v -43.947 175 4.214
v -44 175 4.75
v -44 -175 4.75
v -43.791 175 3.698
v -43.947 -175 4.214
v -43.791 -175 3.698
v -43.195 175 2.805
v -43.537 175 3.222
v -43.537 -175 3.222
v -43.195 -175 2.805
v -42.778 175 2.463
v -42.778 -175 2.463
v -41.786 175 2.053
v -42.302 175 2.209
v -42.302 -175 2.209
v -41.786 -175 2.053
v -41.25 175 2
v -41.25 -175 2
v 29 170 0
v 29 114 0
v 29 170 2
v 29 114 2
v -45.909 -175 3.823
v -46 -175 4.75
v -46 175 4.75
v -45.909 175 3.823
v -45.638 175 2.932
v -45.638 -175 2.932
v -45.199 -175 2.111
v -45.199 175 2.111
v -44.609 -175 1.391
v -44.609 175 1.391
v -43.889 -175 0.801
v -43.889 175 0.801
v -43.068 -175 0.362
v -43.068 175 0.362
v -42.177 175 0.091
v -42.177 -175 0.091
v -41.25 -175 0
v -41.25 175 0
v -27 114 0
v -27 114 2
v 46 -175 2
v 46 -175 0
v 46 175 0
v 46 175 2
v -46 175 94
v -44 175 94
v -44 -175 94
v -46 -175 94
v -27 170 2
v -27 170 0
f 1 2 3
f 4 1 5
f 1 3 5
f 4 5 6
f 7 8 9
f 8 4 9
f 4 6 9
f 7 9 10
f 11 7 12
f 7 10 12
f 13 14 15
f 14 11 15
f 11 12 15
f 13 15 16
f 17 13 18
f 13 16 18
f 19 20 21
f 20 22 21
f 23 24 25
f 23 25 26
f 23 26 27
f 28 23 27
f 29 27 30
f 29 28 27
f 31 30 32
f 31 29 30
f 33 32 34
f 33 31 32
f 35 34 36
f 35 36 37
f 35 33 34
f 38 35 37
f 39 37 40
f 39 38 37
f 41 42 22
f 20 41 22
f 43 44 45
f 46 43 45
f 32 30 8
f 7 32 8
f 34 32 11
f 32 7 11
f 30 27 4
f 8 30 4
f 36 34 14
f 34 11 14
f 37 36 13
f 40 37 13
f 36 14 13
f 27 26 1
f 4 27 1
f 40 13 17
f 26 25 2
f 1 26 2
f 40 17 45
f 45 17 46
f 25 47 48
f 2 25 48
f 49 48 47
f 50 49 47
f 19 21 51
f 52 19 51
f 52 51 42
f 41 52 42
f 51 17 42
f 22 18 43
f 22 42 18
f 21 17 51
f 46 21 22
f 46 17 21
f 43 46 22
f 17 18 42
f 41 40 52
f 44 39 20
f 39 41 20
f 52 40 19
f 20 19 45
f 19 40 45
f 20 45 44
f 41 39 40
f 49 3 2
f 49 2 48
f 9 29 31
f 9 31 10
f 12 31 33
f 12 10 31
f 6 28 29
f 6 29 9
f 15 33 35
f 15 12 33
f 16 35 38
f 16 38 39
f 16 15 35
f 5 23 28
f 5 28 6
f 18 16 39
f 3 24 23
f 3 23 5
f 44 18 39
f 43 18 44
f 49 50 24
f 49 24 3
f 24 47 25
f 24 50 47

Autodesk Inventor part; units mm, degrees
ref_plane "YZ Plane" through (0, 0, 0) normal (1, 0, 0) x (0, 1, 0)
ref_plane "XZ Plane" through (0, 0, 0) normal (0, 1, 0) x (-1, 0, 0)
ref_plane "XY Plane" through (0, 0, 0) normal (0, 0, 1) x (1, 0, 0)
sketch "Sketch1" plane through (0, 0, 0) normal (0, 0, 1) x (1, 0, 0)
  line L0 (-46, -175) -> (46, -175)
  line L1 (46, -175) -> (46, 175)
  line L2 (46, 175) -> (-46, 175)
  line L3 (-46, 175) -> (-46, -175)
  line L4 (-46, -175) -> (46, 175) construction
  line L5 (46, -175) -> (-46, 175) construction
  point P0 (0, 0)
  dimension "d154" = 92
  dimension "d155" = 350
extrude "Plate5" add sketch "Sketch1" along normal blind 2
sketch "Sketch7" plane through (-44, -175, 0) normal (-1, 0, 0) x (0, -1, 0)
  line L0 (-350, 0) -> (0, 0)
  line L1 (0, 0) -> (0, 94)
  line L2 (0, 94) -> (-350, 94)
  line L3 (-350, 94) -> (-350, 0)
edge flange "Flange3" height 94 angle 90 thickness 2 bend radius 2.75 thickness toward (-1, 0, 0) relief round relief width 2 relief depth 1 edges at (-46, 0, 2) wall of the first edge with corners at (-44, 175, 0) (-44, -175, 0) (-44, -175, 94) (-44, 175, 94)
bend "Bend3"
corner "Corner3"
sketch "Sketch8" plane through (0, 0, 2) normal (0, 0, 1) x (1, 0, 0)
  line L0 (46, 175) -> (46, -175) projected
  line L1 (-41.25, 175) -> (46, 175) projected
  line L2 (29, 170) -> (-27, 170)
  line L3 (-27, 170) -> (-27, 114)
  line L4 (-27, 114) -> (29, 114)
  line L5 (29, 114) -> (29, 170)
  line L6 (29, 170) -> (-27, 114) construction
  line L7 (-27, 170) -> (29, 114) construction
  point P0 (0, 0)
  point P1 (1, 142)
  point P2 (2.375, 175)
  dimension "d167" = 56
  dimension "d168" = 56
  dimension "d169" = 5
  dimension "d172" = 17
extrude "Cut1" cut sketch "Sketch8" against normal blind 2
properties part number "TZS 752 FDS 940 FLANGE 2" material "Stainless Steel"
